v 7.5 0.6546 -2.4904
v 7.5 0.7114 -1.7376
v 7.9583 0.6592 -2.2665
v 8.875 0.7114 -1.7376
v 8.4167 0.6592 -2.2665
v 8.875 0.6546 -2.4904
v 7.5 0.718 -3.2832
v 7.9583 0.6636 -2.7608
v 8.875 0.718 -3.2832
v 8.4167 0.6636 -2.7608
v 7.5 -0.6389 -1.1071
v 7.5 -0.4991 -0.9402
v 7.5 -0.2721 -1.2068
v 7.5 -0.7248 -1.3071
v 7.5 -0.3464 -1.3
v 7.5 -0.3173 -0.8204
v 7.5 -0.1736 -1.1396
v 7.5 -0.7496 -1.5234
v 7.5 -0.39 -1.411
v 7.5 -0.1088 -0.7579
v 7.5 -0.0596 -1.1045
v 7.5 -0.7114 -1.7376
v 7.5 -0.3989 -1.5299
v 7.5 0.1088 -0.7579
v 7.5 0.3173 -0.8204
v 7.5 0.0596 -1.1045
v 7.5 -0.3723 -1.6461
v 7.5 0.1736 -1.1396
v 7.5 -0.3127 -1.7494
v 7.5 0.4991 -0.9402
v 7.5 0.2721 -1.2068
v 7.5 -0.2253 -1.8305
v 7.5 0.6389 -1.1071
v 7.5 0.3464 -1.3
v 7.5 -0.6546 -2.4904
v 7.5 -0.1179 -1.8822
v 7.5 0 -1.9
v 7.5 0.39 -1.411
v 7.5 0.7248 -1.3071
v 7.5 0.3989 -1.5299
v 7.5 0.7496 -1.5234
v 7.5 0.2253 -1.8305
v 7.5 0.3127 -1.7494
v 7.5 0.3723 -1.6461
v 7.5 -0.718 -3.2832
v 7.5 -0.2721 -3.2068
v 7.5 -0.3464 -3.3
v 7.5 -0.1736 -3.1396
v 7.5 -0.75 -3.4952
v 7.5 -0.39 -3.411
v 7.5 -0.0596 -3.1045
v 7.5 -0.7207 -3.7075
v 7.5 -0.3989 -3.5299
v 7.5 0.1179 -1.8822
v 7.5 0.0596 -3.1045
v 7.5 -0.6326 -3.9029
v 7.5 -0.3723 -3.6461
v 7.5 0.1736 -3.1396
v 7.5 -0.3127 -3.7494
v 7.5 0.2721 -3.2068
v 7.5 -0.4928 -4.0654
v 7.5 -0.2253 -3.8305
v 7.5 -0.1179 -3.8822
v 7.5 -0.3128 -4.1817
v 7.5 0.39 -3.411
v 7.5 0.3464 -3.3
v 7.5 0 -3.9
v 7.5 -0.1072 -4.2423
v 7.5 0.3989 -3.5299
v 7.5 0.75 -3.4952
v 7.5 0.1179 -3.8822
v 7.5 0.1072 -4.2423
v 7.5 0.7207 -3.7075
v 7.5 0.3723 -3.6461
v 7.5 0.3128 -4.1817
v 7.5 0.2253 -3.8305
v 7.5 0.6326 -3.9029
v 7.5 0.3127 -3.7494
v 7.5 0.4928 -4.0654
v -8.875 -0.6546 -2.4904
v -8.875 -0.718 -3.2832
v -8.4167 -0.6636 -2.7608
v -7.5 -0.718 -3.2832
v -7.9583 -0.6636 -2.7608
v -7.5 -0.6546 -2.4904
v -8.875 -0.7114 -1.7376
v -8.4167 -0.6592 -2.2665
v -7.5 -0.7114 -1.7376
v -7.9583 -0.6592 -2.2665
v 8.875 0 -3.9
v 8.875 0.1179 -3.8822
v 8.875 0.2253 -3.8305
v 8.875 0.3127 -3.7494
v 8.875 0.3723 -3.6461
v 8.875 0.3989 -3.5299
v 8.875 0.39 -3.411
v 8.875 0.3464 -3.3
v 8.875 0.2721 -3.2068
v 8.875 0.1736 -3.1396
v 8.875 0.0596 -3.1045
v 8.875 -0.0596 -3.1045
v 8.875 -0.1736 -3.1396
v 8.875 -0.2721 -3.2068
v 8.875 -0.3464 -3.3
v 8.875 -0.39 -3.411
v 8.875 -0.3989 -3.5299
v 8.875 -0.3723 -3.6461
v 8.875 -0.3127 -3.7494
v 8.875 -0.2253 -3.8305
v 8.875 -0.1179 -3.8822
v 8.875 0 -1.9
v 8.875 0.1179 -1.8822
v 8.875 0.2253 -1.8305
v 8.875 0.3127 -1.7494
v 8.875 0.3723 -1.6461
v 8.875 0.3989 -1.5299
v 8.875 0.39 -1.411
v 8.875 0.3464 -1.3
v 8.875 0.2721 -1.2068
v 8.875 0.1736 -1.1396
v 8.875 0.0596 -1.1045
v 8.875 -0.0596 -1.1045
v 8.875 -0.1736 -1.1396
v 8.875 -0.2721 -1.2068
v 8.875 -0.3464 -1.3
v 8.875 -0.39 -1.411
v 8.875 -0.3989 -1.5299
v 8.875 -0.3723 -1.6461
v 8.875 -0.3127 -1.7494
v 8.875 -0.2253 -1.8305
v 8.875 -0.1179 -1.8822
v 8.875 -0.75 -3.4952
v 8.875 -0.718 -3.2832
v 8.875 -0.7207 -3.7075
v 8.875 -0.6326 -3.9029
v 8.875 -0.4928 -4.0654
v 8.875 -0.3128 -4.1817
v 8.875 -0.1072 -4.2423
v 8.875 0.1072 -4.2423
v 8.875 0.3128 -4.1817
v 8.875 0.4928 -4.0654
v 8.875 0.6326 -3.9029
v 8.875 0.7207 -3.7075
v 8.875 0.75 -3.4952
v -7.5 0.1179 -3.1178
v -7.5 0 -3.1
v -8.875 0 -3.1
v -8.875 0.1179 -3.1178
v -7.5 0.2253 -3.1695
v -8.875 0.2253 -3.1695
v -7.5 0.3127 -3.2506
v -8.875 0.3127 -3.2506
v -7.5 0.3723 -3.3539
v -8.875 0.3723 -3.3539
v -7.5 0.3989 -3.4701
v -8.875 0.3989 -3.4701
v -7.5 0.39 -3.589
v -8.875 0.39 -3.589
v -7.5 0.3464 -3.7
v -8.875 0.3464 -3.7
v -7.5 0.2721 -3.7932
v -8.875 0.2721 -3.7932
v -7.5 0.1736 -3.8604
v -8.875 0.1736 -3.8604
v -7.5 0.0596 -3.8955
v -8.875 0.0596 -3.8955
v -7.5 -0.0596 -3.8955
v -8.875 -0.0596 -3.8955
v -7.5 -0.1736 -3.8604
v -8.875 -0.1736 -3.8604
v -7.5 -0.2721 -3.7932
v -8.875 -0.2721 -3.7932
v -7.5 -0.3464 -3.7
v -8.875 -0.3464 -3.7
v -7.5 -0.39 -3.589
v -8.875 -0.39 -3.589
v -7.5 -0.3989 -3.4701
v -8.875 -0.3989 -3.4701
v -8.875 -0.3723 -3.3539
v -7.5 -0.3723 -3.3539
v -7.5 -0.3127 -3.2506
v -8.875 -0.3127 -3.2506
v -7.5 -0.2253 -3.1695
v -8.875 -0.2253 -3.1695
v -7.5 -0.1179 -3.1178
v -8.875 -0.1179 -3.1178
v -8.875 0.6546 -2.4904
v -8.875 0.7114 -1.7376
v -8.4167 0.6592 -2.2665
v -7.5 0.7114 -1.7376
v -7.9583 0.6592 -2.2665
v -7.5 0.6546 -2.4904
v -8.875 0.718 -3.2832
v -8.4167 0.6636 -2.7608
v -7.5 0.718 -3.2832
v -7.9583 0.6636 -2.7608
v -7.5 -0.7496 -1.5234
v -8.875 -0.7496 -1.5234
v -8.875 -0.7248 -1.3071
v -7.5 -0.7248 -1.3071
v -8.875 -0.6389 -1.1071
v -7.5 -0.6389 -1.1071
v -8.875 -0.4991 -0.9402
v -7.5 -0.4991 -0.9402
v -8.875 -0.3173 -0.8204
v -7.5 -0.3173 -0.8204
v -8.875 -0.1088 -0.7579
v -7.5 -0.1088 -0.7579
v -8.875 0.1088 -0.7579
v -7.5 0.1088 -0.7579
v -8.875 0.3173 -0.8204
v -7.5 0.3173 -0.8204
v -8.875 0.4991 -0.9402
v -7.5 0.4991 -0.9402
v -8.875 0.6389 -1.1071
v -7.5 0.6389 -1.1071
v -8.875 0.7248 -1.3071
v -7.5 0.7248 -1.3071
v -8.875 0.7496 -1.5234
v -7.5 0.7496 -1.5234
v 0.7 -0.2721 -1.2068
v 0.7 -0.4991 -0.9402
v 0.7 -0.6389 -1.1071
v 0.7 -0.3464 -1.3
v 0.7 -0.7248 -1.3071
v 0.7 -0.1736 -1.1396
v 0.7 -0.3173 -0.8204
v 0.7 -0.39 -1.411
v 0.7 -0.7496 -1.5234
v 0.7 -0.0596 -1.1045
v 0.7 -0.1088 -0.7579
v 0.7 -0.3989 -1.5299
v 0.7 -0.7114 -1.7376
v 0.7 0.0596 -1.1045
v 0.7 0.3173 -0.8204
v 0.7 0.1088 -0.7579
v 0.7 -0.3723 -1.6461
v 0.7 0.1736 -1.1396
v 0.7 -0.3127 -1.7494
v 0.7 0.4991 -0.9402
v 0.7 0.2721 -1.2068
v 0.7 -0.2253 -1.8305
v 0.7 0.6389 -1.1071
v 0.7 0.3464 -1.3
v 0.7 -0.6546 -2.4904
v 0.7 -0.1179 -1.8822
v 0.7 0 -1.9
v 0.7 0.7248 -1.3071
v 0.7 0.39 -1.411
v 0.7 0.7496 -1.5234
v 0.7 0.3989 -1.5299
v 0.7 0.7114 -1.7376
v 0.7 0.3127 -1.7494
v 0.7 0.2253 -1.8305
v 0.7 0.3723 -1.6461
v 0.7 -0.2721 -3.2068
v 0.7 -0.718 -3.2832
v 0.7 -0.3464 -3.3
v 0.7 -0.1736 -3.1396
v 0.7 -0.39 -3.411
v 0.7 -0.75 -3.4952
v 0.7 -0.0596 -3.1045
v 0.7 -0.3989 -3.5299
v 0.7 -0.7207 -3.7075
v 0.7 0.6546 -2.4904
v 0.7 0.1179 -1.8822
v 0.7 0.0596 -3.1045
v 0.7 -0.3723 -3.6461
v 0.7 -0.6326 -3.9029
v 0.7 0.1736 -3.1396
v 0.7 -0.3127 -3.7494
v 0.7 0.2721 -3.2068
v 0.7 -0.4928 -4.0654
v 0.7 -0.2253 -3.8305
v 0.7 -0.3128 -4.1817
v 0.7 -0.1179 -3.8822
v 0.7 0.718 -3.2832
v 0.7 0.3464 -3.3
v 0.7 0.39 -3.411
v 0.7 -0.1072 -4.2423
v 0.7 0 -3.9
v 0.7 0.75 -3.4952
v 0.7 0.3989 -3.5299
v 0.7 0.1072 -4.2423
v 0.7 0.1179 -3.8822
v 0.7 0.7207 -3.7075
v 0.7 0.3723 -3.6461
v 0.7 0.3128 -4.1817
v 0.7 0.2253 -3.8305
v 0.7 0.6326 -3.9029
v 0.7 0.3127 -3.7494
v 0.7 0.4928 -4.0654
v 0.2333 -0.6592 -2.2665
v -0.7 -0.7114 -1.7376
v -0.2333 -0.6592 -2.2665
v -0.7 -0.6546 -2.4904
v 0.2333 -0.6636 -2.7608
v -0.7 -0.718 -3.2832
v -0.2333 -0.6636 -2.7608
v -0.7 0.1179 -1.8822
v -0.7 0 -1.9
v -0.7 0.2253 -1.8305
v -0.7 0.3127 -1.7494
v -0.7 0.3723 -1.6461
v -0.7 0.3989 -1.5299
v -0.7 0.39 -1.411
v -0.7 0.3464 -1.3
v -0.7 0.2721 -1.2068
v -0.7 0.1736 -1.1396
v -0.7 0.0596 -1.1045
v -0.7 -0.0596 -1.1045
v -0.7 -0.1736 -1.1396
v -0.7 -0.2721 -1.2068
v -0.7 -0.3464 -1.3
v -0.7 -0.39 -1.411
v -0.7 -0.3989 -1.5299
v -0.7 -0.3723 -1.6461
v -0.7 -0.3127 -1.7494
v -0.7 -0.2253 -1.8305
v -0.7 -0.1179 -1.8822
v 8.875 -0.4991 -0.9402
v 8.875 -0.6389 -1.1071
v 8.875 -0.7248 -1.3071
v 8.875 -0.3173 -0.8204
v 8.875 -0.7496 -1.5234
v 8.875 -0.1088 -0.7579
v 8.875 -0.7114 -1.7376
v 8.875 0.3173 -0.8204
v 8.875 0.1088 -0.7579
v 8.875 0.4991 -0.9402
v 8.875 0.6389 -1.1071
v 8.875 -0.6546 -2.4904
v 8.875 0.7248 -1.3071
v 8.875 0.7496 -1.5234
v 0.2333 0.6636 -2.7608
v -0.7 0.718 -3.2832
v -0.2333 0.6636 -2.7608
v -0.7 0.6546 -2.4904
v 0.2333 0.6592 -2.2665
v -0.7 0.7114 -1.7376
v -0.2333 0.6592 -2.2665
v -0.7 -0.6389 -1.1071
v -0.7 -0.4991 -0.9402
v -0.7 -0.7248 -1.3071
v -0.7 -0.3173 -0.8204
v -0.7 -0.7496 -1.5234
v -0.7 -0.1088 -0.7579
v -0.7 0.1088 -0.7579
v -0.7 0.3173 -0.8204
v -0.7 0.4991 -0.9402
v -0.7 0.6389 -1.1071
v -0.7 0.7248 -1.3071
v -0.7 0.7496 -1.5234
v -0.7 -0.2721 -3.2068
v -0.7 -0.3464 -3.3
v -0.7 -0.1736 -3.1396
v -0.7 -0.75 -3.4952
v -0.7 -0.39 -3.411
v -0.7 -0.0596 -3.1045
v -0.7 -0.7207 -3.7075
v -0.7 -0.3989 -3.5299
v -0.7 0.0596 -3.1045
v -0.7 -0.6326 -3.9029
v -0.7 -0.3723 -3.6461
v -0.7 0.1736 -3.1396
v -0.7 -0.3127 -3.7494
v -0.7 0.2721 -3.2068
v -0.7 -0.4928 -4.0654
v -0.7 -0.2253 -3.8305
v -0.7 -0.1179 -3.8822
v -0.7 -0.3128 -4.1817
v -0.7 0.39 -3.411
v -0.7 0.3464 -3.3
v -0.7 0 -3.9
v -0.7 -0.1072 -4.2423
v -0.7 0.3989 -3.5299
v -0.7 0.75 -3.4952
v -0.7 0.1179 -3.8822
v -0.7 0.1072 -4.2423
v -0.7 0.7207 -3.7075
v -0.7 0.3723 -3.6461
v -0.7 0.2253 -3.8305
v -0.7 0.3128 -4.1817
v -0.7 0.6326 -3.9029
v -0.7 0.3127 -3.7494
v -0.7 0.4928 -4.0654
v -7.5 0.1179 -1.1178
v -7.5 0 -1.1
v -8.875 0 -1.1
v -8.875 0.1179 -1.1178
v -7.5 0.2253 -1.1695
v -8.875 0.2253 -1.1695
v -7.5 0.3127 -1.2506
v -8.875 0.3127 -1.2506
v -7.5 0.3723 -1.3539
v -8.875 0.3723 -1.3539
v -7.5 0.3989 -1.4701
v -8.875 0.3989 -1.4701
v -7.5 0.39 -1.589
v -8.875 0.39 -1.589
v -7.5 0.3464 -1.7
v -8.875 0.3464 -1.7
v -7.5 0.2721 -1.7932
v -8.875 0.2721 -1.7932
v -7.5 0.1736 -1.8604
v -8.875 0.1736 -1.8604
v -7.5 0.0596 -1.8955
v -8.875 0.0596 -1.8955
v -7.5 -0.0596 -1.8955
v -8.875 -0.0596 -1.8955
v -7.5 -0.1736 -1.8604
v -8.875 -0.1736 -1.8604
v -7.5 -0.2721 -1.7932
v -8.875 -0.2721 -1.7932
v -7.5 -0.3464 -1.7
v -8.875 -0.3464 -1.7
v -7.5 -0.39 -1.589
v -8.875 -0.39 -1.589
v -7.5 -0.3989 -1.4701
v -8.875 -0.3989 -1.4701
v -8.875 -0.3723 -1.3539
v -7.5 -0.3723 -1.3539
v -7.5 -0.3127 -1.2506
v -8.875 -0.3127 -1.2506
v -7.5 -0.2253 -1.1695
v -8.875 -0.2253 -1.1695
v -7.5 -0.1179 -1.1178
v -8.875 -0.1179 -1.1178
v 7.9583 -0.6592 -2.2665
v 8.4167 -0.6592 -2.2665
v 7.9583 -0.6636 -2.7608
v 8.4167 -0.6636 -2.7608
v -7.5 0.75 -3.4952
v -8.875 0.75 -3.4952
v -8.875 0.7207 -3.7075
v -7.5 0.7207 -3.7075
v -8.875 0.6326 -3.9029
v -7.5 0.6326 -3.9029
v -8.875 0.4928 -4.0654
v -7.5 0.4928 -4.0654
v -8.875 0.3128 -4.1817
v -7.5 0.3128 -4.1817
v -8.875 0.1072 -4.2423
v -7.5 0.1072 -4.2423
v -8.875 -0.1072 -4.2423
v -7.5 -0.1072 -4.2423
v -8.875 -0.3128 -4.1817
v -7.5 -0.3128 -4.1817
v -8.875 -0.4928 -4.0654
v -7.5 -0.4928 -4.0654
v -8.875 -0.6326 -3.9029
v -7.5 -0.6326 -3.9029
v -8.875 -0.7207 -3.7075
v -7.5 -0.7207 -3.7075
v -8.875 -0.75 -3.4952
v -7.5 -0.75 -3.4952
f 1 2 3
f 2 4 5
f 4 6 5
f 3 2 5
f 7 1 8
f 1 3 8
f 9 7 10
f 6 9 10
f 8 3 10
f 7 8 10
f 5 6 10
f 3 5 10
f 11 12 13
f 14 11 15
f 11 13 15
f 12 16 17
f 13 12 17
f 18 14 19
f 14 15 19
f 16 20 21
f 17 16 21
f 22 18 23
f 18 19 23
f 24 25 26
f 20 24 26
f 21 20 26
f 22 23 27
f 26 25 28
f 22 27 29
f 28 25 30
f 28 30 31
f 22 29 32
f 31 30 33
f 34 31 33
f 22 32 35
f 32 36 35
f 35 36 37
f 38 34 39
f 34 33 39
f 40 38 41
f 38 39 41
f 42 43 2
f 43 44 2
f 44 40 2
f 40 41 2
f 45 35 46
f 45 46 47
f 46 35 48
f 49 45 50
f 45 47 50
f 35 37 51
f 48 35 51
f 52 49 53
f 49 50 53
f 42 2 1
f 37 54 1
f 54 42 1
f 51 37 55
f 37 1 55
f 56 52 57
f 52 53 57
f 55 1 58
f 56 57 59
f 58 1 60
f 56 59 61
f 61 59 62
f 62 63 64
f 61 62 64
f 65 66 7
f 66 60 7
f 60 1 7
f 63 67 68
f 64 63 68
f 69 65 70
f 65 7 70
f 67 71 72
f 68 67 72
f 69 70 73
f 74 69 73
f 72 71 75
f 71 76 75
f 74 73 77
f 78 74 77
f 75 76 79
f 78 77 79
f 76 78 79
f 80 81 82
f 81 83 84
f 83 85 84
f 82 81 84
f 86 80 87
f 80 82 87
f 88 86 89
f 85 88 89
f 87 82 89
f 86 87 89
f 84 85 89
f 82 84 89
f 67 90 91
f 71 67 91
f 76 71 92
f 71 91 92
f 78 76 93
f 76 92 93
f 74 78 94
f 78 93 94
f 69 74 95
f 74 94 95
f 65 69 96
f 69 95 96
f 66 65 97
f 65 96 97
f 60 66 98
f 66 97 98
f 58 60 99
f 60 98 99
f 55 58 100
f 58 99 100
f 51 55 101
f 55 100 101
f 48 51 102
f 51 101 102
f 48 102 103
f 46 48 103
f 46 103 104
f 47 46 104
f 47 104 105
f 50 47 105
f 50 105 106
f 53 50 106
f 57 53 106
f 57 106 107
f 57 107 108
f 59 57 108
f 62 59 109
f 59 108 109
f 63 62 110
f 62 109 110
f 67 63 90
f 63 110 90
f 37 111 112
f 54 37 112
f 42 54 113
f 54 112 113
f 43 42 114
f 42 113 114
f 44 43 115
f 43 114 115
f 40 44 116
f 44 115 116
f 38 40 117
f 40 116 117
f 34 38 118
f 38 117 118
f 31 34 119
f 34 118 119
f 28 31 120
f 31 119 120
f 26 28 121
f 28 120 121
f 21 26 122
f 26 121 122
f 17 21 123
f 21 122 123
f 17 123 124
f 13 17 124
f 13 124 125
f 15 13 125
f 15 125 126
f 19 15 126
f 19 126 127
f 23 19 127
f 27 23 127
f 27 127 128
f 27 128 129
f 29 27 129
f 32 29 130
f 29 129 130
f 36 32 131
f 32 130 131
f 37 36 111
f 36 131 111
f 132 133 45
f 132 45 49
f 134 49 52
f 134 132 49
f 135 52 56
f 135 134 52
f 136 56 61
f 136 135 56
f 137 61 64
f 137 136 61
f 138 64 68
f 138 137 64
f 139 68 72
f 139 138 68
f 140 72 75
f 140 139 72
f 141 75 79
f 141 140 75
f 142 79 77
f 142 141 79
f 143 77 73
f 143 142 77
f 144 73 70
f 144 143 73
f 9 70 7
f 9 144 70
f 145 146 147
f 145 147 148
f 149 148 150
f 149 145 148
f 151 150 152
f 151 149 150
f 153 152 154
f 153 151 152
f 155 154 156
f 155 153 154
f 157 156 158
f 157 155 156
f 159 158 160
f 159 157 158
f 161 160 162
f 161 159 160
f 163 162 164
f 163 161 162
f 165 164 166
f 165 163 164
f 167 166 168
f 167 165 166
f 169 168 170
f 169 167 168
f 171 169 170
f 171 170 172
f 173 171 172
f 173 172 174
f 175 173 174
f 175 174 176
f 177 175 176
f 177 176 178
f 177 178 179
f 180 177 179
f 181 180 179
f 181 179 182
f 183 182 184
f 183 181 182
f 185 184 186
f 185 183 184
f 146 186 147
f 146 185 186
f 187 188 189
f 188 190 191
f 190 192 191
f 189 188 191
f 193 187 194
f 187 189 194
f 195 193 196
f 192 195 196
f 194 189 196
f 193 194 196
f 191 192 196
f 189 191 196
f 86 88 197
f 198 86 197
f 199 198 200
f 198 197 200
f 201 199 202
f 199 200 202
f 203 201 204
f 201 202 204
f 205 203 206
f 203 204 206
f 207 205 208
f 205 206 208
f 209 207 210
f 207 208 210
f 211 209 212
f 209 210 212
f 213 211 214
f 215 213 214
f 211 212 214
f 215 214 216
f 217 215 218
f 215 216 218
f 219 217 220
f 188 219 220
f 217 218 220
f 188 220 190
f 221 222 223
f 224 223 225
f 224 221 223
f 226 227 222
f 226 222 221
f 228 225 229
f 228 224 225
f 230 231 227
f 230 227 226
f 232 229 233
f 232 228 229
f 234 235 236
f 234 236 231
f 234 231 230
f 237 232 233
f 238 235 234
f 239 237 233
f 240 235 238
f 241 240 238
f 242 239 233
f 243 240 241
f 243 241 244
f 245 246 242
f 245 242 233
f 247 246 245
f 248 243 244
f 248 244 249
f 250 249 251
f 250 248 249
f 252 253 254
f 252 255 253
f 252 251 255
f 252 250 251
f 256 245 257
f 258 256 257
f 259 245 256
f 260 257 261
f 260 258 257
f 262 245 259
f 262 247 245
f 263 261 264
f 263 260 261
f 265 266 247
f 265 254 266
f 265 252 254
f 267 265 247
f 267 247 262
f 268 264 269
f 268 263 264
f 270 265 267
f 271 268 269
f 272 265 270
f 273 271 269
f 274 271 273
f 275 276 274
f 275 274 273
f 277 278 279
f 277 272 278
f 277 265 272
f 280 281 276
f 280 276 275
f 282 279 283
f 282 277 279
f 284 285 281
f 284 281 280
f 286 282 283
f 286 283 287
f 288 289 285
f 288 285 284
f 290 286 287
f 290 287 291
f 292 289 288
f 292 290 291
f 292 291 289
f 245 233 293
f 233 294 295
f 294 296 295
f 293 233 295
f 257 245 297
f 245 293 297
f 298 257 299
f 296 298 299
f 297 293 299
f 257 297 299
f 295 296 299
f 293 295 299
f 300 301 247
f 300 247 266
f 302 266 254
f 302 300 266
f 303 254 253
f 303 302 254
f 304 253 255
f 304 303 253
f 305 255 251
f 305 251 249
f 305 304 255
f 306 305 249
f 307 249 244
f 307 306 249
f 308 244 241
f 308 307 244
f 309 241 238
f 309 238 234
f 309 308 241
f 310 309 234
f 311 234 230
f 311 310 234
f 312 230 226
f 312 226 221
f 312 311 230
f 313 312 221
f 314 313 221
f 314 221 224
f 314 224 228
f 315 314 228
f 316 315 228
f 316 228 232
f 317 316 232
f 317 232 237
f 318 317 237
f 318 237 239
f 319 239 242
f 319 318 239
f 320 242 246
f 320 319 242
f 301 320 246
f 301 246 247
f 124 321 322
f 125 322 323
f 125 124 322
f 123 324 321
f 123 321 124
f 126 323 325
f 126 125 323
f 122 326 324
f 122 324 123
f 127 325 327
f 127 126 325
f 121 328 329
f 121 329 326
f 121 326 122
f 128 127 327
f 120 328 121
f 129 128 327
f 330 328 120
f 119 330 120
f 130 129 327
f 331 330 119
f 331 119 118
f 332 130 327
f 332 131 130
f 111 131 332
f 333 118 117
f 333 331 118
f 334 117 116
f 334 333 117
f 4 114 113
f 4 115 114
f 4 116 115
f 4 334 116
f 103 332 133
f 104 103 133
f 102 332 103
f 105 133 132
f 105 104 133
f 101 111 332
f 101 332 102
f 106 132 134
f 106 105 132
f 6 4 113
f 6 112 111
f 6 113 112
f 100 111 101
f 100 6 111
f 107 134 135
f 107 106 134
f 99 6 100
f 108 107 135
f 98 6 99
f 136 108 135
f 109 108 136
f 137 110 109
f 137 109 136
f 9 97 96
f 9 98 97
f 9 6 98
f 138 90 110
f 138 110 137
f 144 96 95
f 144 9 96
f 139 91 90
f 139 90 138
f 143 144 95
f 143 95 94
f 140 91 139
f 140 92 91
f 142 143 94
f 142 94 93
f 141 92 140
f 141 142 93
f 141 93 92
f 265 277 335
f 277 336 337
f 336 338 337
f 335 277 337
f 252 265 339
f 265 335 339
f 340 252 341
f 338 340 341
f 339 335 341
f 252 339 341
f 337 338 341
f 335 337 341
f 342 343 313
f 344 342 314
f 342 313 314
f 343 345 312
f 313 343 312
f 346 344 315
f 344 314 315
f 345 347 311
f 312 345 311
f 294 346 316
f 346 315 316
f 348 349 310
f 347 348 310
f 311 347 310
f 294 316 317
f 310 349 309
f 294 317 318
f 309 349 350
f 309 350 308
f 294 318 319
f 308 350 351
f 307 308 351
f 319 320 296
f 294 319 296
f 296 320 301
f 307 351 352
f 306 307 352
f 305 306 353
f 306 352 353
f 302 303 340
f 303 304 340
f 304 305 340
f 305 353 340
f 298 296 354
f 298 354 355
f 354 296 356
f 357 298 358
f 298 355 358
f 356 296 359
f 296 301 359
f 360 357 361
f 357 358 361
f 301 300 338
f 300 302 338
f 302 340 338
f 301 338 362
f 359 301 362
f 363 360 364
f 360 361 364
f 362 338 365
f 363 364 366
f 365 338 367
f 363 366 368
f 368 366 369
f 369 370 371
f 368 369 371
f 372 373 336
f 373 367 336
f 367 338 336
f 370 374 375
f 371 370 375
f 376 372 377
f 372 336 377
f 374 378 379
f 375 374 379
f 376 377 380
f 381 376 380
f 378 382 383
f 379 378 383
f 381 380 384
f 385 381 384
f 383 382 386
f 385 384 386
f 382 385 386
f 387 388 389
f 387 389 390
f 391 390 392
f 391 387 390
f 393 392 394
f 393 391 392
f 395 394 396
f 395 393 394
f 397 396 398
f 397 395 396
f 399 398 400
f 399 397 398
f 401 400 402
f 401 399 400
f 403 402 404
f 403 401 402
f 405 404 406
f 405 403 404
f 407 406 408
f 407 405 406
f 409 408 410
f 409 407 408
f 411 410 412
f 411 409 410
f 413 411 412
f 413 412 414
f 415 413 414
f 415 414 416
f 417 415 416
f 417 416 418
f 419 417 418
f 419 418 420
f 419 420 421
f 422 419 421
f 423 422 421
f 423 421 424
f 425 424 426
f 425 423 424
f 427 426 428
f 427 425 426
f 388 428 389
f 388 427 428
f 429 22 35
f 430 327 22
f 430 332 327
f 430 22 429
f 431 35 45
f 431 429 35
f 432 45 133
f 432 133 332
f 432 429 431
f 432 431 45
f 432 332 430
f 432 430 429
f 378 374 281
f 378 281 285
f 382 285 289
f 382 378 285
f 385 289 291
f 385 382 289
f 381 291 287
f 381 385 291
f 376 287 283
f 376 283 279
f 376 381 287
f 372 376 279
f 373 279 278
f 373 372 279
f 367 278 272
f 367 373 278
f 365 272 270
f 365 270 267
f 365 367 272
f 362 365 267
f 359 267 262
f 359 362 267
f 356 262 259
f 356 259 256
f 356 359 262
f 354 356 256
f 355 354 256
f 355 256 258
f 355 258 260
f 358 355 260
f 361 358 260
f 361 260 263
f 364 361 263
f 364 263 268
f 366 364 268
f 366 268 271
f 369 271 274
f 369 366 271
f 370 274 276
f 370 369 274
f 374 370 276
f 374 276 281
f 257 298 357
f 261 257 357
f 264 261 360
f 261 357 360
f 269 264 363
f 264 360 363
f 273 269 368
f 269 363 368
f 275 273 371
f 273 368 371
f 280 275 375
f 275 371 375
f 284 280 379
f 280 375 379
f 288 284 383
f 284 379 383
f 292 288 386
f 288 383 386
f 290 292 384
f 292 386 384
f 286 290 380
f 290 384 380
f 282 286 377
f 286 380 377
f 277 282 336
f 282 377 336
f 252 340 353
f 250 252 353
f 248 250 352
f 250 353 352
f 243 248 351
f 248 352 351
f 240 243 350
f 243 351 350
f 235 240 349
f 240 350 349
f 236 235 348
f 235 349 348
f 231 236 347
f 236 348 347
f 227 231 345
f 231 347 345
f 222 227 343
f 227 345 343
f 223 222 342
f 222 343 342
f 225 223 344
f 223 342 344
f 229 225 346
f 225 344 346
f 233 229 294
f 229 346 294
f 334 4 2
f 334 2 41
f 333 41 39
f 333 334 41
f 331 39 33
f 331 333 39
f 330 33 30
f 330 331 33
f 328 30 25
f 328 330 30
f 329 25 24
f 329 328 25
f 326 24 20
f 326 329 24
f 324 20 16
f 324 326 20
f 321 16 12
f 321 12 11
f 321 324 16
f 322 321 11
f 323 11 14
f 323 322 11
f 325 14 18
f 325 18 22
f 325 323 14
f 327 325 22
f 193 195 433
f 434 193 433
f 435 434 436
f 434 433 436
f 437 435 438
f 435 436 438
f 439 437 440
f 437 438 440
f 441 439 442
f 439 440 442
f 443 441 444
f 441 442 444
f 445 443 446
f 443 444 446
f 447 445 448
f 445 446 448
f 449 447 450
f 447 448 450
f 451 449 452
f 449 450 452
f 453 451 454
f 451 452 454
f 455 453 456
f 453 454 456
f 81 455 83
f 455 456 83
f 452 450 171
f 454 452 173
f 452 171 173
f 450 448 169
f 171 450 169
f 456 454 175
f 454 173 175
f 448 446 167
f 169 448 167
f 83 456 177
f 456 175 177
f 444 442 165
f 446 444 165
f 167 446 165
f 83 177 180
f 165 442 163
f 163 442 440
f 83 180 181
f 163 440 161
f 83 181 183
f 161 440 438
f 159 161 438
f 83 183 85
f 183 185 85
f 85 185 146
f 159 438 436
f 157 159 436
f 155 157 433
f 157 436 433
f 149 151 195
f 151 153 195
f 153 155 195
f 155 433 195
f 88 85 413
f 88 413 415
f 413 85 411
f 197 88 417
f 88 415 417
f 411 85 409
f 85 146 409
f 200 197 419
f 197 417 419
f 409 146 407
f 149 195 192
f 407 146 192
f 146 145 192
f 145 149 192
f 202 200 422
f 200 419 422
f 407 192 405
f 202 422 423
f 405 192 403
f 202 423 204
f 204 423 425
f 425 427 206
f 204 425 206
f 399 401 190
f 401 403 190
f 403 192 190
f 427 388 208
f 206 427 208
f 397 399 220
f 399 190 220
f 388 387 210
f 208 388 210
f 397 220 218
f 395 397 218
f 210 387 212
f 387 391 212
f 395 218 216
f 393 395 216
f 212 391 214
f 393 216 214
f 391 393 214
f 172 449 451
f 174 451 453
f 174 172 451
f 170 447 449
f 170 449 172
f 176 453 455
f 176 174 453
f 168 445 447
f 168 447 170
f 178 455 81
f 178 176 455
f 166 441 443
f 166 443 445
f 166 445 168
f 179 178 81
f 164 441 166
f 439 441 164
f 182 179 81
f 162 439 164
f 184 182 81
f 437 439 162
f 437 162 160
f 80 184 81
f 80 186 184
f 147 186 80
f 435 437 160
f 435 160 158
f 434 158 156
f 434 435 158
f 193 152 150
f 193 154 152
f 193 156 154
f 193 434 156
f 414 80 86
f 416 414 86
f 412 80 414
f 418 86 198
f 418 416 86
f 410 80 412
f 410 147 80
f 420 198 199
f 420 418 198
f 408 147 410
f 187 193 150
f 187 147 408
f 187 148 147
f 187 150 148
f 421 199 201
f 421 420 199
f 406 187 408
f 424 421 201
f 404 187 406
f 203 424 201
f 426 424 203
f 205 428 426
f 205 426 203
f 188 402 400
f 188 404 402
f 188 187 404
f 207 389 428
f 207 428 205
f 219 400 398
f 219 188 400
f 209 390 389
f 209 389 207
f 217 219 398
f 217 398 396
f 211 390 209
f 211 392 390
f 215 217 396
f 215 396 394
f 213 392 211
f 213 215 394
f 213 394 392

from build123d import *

# Parameters (mm, degrees)
ESBO_O1_R                = 0.4
RESSALTO_EXTRUS_O1_DEPTH = 1.375
ESBO_O2_R                = 0.4
RESSALTO_EXTRUS_O2_DEPTH = 1.375
ESBO_O3_R                = 0.4
RESSALTO_EXTRUS_O3_DEPTH = 1.4


with BuildPart() as part:
    # Esboço1 → Ressalto-extrusão1 (new body)
    with BuildSketch(Plane(origin=(8.875, 0, 0), x_dir=(0, 0, -1), z_dir=(1, 0, 0))):
        with BuildLine():
            ThreePointArc((1.737638655, 0.711356359), (0.75, 0), (1.737638655, -0.711356359))
            add(Edge.make_bspline(
                [(1.737638655, -0.711356359), (2.304737892, -0.628628532), (2.725714325, -0.640882332), (3.28320883, -0.717984393)],
                knots=[0.106827287, 0.106827287, 0.106827287, 0.106827287, 0.900451135, 0.900451135, 0.900451135, 0.900451135], degree=3))
            ThreePointArc((3.28320883, -0.717984393), (4.25, 0), (3.28320883, 0.717984393))
            add(Edge.make_bspline(
                [(1.737638655, 0.711356359), (2.304737892, 0.628628532), (2.725714325, 0.640882332), (3.28320883, 0.717984393)],
                knots=[0.106827287, 0.106827287, 0.106827287, 0.106827287, 0.900451135, 0.900451135, 0.900451135, 0.900451135], degree=3))
        make_face()
        with Locations((1.5, 0)):
            Circle(ESBO_O1_R, mode=Mode.SUBTRACT)
        with Locations((3.5, 0)):
            Circle(ESBO_O1_R, mode=Mode.SUBTRACT)
    extrude(amount=-RESSALTO_EXTRUS_O1_DEPTH)


with BuildPart() as body_2:
    # Esboço2 → Ressalto-extrusão2 (new body)
    with BuildSketch(Plane.ZY.offset(7.5)):
        with BuildLine():
            ThreePointArc((-1.737638655, -0.711356359), (-0.75, 0), (-1.737638655, 0.711356359))
            add(Edge.make_bspline(
                [(-1.737638655, 0.711356359), (-2.304737892, 0.628628532), (-2.725714325, 0.640882332), (-3.28320883, 0.717984393)],
                knots=[0.106827287, 0.106827287, 0.106827287, 0.106827287, 0.900451135, 0.900451135, 0.900451135, 0.900451135], degree=3))
            ThreePointArc((-3.28320883, 0.717984393), (-4.25, 0), (-3.28320883, -0.717984393))
            add(Edge.make_bspline(
                [(-3.28320883, -0.717984393), (-2.725714325, -0.640882332), (-2.304737892, -0.628628532), (-1.737638655, -0.711356359)],
                knots=[0.106827287, 0.106827287, 0.106827287, 0.106827287, 0.900451135, 0.900451135, 0.900451135, 0.900451135], degree=3))
        make_face()
        with Locations((-3.5, 0)):
            Circle(ESBO_O2_R, mode=Mode.SUBTRACT)
        with Locations((-1.5, 0)):
            Circle(ESBO_O2_R, mode=Mode.SUBTRACT)
    extrude(amount=RESSALTO_EXTRUS_O2_DEPTH)


with BuildPart() as body_3:
    # Esboço3 → Ressalto-extrusão3 (new body)
    with BuildSketch(Plane(origin=(-0.7, 0, 0), x_dir=(0, 0, -1), z_dir=(1, 0, 0))):
        with BuildLine():
            ThreePointArc((1.737638655, 0.711356359), (0.75, 0), (1.737638655, -0.711356359))
            add(Edge.make_bspline(
                [(1.737638655, -0.711356359), (2.304737892, -0.628628532), (2.725714325, -0.640882332), (3.28320883, -0.717984393)],
                knots=[0.106827287, 0.106827287, 0.106827287, 0.106827287, 0.900451135, 0.900451135, 0.900451135, 0.900451135], degree=3))
            ThreePointArc((3.28320883, -0.717984393), (4.25, 0), (3.28320883, 0.717984393))
            add(Edge.make_bspline(
                [(3.28320883, 0.717984393), (2.725714325, 0.640882332), (2.304737892, 0.628628532), (1.737638655, 0.711356359)],
                knots=[0.106827287, 0.106827287, 0.106827287, 0.106827287, 0.900451135, 0.900451135, 0.900451135, 0.900451135], degree=3))
        make_face()
        with Locations((3.5, 0)):
            Circle(ESBO_O3_R, mode=Mode.SUBTRACT)
        with Locations((1.5, 0)):
            Circle(ESBO_O3_R, mode=Mode.SUBTRACT)
    extrude(amount=RESSALTO_EXTRUS_O3_DEPTH)


solid = Compound([part.part, body_2.part, body_3.part])
